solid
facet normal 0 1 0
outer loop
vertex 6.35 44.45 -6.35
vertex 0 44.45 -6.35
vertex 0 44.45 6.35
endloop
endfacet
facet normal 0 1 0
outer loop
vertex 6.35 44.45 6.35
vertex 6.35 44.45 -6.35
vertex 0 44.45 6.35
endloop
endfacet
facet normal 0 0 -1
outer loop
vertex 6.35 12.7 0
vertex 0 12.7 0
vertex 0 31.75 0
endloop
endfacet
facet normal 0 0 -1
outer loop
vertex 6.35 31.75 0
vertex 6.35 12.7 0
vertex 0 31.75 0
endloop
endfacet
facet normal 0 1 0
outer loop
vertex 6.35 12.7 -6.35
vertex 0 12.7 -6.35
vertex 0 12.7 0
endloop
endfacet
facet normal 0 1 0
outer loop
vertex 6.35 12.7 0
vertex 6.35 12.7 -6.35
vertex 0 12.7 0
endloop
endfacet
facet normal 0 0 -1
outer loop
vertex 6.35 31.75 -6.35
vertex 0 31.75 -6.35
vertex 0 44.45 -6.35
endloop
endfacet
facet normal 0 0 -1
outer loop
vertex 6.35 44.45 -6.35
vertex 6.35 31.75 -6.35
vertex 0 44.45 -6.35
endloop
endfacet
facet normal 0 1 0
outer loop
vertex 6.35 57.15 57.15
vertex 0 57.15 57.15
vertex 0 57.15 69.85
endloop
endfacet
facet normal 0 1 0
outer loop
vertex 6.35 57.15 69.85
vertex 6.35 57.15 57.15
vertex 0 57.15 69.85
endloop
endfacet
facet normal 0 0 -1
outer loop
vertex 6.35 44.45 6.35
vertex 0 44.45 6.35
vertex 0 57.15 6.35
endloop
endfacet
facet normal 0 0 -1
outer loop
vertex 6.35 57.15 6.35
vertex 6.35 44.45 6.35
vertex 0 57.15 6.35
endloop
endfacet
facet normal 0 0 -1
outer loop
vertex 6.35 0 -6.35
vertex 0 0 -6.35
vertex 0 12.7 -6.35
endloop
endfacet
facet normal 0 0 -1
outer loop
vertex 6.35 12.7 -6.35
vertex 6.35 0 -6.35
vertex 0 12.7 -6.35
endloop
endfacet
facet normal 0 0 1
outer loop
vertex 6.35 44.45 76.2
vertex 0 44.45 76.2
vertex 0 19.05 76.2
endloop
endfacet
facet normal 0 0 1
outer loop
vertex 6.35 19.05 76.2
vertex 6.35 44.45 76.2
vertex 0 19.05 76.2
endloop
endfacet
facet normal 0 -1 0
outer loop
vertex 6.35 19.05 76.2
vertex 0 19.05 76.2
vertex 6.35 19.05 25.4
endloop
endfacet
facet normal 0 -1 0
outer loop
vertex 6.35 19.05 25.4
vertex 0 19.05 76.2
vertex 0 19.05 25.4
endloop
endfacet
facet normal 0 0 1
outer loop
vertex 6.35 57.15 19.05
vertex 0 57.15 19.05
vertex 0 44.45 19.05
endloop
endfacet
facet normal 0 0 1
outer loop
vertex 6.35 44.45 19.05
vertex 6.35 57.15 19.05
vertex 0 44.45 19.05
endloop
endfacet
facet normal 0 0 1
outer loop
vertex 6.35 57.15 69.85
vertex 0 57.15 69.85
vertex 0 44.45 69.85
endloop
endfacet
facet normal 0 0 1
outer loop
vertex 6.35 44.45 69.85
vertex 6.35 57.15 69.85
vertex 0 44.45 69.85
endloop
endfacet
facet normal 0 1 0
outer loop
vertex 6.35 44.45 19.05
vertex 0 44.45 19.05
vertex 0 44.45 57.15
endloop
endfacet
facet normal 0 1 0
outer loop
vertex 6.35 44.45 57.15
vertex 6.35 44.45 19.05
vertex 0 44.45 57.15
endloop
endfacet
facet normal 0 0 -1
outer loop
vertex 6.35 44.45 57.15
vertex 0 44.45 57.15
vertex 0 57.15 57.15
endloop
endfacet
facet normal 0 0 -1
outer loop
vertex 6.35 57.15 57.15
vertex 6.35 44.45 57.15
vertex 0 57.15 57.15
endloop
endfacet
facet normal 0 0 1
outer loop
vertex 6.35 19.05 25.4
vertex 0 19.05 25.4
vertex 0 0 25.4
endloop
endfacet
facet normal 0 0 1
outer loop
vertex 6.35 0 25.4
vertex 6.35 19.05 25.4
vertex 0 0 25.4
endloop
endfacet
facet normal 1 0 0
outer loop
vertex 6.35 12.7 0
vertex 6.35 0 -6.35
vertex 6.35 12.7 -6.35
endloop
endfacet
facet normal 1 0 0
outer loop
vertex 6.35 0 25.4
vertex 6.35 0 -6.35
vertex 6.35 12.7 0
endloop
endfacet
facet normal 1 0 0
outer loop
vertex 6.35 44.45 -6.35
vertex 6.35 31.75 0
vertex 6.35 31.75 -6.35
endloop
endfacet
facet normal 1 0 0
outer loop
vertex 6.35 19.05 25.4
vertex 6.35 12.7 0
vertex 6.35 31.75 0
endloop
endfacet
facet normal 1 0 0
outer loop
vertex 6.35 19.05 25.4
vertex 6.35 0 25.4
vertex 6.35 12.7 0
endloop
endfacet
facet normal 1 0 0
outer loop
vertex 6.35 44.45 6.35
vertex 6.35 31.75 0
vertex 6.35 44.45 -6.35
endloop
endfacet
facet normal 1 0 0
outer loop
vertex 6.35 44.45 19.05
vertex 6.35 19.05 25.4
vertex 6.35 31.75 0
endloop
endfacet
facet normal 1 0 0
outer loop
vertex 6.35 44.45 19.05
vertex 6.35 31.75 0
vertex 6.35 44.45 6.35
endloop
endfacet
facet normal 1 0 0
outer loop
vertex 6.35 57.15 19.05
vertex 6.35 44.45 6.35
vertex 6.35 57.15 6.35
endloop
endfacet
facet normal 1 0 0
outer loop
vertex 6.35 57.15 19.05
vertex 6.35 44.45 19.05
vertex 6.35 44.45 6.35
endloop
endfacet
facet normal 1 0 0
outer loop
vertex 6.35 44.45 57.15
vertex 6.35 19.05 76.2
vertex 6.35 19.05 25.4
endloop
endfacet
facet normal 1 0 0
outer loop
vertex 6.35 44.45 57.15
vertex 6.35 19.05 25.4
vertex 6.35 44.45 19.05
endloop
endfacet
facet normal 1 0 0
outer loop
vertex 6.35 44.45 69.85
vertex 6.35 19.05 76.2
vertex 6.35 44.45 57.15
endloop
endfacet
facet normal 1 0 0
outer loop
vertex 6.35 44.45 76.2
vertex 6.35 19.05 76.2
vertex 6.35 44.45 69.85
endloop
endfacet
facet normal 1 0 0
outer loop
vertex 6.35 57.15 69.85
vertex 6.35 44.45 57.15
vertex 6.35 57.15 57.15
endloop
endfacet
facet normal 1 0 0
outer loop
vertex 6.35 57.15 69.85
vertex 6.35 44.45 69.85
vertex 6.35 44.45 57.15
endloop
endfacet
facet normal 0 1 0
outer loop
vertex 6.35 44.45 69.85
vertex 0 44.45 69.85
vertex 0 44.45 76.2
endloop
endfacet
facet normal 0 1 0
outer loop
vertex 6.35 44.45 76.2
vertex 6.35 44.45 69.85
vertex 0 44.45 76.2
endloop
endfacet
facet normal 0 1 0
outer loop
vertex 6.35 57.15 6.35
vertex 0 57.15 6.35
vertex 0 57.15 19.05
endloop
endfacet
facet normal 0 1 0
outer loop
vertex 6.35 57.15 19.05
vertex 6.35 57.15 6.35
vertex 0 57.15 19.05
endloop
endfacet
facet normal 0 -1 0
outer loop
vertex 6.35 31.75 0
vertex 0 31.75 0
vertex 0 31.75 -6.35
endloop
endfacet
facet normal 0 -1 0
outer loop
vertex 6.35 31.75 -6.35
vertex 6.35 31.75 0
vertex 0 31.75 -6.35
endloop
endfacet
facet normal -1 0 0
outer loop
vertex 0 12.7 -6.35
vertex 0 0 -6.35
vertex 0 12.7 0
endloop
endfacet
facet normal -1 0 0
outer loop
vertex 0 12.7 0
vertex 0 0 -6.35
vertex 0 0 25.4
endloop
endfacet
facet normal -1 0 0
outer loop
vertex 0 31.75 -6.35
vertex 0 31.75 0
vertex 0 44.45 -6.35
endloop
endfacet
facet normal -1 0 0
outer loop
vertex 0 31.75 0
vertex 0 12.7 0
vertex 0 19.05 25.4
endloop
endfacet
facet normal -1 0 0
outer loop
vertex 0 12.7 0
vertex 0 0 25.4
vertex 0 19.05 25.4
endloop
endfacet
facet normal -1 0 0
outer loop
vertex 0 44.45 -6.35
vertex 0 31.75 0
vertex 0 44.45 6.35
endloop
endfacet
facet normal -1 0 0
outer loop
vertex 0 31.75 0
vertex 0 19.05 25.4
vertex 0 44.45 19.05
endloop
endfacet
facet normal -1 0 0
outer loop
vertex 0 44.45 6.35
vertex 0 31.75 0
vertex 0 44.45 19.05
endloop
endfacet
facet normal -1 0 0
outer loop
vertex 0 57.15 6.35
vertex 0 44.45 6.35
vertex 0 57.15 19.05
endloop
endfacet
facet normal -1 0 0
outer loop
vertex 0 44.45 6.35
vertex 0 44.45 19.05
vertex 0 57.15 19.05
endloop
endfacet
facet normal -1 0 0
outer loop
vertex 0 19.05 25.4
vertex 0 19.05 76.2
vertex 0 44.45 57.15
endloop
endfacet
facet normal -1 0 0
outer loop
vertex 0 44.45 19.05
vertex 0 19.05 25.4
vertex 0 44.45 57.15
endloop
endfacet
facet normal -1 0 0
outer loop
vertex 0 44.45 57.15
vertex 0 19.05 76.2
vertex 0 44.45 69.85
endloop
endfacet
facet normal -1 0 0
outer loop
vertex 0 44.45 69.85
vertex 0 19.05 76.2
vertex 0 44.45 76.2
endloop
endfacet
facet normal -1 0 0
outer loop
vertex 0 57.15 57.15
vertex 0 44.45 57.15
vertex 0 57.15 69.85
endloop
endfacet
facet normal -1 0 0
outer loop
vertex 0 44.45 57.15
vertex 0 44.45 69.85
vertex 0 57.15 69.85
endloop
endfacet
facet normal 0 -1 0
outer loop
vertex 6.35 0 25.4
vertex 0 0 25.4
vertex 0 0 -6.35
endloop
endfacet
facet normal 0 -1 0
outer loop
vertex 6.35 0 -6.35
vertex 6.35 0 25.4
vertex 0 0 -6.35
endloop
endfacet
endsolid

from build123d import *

# Parameters (mm, degrees)
F1_DEPTH = 6.35


with BuildPart() as f1:
    # F0 (on Right) → F1 (new body)
    with BuildSketch(Plane.YZ):
        Polygon((0, 25.4), (0, 0), (0, -6.35), (12.7, -6.35), (12.7, 0), (31.75, 0), (31.75, -6.35), (44.45, -6.35), (44.45, 6.35), (57.15, 6.35), (57.15, 19.05), (44.45, 19.05), (44.45, 57.15), (57.15, 57.15), (57.15, 69.85), (44.45, 69.85), (44.45, 76.2), (19.05, 76.2), (19.05, 25.4), align=None)
    extrude(amount=F1_DEPTH)


solid = f1.part
